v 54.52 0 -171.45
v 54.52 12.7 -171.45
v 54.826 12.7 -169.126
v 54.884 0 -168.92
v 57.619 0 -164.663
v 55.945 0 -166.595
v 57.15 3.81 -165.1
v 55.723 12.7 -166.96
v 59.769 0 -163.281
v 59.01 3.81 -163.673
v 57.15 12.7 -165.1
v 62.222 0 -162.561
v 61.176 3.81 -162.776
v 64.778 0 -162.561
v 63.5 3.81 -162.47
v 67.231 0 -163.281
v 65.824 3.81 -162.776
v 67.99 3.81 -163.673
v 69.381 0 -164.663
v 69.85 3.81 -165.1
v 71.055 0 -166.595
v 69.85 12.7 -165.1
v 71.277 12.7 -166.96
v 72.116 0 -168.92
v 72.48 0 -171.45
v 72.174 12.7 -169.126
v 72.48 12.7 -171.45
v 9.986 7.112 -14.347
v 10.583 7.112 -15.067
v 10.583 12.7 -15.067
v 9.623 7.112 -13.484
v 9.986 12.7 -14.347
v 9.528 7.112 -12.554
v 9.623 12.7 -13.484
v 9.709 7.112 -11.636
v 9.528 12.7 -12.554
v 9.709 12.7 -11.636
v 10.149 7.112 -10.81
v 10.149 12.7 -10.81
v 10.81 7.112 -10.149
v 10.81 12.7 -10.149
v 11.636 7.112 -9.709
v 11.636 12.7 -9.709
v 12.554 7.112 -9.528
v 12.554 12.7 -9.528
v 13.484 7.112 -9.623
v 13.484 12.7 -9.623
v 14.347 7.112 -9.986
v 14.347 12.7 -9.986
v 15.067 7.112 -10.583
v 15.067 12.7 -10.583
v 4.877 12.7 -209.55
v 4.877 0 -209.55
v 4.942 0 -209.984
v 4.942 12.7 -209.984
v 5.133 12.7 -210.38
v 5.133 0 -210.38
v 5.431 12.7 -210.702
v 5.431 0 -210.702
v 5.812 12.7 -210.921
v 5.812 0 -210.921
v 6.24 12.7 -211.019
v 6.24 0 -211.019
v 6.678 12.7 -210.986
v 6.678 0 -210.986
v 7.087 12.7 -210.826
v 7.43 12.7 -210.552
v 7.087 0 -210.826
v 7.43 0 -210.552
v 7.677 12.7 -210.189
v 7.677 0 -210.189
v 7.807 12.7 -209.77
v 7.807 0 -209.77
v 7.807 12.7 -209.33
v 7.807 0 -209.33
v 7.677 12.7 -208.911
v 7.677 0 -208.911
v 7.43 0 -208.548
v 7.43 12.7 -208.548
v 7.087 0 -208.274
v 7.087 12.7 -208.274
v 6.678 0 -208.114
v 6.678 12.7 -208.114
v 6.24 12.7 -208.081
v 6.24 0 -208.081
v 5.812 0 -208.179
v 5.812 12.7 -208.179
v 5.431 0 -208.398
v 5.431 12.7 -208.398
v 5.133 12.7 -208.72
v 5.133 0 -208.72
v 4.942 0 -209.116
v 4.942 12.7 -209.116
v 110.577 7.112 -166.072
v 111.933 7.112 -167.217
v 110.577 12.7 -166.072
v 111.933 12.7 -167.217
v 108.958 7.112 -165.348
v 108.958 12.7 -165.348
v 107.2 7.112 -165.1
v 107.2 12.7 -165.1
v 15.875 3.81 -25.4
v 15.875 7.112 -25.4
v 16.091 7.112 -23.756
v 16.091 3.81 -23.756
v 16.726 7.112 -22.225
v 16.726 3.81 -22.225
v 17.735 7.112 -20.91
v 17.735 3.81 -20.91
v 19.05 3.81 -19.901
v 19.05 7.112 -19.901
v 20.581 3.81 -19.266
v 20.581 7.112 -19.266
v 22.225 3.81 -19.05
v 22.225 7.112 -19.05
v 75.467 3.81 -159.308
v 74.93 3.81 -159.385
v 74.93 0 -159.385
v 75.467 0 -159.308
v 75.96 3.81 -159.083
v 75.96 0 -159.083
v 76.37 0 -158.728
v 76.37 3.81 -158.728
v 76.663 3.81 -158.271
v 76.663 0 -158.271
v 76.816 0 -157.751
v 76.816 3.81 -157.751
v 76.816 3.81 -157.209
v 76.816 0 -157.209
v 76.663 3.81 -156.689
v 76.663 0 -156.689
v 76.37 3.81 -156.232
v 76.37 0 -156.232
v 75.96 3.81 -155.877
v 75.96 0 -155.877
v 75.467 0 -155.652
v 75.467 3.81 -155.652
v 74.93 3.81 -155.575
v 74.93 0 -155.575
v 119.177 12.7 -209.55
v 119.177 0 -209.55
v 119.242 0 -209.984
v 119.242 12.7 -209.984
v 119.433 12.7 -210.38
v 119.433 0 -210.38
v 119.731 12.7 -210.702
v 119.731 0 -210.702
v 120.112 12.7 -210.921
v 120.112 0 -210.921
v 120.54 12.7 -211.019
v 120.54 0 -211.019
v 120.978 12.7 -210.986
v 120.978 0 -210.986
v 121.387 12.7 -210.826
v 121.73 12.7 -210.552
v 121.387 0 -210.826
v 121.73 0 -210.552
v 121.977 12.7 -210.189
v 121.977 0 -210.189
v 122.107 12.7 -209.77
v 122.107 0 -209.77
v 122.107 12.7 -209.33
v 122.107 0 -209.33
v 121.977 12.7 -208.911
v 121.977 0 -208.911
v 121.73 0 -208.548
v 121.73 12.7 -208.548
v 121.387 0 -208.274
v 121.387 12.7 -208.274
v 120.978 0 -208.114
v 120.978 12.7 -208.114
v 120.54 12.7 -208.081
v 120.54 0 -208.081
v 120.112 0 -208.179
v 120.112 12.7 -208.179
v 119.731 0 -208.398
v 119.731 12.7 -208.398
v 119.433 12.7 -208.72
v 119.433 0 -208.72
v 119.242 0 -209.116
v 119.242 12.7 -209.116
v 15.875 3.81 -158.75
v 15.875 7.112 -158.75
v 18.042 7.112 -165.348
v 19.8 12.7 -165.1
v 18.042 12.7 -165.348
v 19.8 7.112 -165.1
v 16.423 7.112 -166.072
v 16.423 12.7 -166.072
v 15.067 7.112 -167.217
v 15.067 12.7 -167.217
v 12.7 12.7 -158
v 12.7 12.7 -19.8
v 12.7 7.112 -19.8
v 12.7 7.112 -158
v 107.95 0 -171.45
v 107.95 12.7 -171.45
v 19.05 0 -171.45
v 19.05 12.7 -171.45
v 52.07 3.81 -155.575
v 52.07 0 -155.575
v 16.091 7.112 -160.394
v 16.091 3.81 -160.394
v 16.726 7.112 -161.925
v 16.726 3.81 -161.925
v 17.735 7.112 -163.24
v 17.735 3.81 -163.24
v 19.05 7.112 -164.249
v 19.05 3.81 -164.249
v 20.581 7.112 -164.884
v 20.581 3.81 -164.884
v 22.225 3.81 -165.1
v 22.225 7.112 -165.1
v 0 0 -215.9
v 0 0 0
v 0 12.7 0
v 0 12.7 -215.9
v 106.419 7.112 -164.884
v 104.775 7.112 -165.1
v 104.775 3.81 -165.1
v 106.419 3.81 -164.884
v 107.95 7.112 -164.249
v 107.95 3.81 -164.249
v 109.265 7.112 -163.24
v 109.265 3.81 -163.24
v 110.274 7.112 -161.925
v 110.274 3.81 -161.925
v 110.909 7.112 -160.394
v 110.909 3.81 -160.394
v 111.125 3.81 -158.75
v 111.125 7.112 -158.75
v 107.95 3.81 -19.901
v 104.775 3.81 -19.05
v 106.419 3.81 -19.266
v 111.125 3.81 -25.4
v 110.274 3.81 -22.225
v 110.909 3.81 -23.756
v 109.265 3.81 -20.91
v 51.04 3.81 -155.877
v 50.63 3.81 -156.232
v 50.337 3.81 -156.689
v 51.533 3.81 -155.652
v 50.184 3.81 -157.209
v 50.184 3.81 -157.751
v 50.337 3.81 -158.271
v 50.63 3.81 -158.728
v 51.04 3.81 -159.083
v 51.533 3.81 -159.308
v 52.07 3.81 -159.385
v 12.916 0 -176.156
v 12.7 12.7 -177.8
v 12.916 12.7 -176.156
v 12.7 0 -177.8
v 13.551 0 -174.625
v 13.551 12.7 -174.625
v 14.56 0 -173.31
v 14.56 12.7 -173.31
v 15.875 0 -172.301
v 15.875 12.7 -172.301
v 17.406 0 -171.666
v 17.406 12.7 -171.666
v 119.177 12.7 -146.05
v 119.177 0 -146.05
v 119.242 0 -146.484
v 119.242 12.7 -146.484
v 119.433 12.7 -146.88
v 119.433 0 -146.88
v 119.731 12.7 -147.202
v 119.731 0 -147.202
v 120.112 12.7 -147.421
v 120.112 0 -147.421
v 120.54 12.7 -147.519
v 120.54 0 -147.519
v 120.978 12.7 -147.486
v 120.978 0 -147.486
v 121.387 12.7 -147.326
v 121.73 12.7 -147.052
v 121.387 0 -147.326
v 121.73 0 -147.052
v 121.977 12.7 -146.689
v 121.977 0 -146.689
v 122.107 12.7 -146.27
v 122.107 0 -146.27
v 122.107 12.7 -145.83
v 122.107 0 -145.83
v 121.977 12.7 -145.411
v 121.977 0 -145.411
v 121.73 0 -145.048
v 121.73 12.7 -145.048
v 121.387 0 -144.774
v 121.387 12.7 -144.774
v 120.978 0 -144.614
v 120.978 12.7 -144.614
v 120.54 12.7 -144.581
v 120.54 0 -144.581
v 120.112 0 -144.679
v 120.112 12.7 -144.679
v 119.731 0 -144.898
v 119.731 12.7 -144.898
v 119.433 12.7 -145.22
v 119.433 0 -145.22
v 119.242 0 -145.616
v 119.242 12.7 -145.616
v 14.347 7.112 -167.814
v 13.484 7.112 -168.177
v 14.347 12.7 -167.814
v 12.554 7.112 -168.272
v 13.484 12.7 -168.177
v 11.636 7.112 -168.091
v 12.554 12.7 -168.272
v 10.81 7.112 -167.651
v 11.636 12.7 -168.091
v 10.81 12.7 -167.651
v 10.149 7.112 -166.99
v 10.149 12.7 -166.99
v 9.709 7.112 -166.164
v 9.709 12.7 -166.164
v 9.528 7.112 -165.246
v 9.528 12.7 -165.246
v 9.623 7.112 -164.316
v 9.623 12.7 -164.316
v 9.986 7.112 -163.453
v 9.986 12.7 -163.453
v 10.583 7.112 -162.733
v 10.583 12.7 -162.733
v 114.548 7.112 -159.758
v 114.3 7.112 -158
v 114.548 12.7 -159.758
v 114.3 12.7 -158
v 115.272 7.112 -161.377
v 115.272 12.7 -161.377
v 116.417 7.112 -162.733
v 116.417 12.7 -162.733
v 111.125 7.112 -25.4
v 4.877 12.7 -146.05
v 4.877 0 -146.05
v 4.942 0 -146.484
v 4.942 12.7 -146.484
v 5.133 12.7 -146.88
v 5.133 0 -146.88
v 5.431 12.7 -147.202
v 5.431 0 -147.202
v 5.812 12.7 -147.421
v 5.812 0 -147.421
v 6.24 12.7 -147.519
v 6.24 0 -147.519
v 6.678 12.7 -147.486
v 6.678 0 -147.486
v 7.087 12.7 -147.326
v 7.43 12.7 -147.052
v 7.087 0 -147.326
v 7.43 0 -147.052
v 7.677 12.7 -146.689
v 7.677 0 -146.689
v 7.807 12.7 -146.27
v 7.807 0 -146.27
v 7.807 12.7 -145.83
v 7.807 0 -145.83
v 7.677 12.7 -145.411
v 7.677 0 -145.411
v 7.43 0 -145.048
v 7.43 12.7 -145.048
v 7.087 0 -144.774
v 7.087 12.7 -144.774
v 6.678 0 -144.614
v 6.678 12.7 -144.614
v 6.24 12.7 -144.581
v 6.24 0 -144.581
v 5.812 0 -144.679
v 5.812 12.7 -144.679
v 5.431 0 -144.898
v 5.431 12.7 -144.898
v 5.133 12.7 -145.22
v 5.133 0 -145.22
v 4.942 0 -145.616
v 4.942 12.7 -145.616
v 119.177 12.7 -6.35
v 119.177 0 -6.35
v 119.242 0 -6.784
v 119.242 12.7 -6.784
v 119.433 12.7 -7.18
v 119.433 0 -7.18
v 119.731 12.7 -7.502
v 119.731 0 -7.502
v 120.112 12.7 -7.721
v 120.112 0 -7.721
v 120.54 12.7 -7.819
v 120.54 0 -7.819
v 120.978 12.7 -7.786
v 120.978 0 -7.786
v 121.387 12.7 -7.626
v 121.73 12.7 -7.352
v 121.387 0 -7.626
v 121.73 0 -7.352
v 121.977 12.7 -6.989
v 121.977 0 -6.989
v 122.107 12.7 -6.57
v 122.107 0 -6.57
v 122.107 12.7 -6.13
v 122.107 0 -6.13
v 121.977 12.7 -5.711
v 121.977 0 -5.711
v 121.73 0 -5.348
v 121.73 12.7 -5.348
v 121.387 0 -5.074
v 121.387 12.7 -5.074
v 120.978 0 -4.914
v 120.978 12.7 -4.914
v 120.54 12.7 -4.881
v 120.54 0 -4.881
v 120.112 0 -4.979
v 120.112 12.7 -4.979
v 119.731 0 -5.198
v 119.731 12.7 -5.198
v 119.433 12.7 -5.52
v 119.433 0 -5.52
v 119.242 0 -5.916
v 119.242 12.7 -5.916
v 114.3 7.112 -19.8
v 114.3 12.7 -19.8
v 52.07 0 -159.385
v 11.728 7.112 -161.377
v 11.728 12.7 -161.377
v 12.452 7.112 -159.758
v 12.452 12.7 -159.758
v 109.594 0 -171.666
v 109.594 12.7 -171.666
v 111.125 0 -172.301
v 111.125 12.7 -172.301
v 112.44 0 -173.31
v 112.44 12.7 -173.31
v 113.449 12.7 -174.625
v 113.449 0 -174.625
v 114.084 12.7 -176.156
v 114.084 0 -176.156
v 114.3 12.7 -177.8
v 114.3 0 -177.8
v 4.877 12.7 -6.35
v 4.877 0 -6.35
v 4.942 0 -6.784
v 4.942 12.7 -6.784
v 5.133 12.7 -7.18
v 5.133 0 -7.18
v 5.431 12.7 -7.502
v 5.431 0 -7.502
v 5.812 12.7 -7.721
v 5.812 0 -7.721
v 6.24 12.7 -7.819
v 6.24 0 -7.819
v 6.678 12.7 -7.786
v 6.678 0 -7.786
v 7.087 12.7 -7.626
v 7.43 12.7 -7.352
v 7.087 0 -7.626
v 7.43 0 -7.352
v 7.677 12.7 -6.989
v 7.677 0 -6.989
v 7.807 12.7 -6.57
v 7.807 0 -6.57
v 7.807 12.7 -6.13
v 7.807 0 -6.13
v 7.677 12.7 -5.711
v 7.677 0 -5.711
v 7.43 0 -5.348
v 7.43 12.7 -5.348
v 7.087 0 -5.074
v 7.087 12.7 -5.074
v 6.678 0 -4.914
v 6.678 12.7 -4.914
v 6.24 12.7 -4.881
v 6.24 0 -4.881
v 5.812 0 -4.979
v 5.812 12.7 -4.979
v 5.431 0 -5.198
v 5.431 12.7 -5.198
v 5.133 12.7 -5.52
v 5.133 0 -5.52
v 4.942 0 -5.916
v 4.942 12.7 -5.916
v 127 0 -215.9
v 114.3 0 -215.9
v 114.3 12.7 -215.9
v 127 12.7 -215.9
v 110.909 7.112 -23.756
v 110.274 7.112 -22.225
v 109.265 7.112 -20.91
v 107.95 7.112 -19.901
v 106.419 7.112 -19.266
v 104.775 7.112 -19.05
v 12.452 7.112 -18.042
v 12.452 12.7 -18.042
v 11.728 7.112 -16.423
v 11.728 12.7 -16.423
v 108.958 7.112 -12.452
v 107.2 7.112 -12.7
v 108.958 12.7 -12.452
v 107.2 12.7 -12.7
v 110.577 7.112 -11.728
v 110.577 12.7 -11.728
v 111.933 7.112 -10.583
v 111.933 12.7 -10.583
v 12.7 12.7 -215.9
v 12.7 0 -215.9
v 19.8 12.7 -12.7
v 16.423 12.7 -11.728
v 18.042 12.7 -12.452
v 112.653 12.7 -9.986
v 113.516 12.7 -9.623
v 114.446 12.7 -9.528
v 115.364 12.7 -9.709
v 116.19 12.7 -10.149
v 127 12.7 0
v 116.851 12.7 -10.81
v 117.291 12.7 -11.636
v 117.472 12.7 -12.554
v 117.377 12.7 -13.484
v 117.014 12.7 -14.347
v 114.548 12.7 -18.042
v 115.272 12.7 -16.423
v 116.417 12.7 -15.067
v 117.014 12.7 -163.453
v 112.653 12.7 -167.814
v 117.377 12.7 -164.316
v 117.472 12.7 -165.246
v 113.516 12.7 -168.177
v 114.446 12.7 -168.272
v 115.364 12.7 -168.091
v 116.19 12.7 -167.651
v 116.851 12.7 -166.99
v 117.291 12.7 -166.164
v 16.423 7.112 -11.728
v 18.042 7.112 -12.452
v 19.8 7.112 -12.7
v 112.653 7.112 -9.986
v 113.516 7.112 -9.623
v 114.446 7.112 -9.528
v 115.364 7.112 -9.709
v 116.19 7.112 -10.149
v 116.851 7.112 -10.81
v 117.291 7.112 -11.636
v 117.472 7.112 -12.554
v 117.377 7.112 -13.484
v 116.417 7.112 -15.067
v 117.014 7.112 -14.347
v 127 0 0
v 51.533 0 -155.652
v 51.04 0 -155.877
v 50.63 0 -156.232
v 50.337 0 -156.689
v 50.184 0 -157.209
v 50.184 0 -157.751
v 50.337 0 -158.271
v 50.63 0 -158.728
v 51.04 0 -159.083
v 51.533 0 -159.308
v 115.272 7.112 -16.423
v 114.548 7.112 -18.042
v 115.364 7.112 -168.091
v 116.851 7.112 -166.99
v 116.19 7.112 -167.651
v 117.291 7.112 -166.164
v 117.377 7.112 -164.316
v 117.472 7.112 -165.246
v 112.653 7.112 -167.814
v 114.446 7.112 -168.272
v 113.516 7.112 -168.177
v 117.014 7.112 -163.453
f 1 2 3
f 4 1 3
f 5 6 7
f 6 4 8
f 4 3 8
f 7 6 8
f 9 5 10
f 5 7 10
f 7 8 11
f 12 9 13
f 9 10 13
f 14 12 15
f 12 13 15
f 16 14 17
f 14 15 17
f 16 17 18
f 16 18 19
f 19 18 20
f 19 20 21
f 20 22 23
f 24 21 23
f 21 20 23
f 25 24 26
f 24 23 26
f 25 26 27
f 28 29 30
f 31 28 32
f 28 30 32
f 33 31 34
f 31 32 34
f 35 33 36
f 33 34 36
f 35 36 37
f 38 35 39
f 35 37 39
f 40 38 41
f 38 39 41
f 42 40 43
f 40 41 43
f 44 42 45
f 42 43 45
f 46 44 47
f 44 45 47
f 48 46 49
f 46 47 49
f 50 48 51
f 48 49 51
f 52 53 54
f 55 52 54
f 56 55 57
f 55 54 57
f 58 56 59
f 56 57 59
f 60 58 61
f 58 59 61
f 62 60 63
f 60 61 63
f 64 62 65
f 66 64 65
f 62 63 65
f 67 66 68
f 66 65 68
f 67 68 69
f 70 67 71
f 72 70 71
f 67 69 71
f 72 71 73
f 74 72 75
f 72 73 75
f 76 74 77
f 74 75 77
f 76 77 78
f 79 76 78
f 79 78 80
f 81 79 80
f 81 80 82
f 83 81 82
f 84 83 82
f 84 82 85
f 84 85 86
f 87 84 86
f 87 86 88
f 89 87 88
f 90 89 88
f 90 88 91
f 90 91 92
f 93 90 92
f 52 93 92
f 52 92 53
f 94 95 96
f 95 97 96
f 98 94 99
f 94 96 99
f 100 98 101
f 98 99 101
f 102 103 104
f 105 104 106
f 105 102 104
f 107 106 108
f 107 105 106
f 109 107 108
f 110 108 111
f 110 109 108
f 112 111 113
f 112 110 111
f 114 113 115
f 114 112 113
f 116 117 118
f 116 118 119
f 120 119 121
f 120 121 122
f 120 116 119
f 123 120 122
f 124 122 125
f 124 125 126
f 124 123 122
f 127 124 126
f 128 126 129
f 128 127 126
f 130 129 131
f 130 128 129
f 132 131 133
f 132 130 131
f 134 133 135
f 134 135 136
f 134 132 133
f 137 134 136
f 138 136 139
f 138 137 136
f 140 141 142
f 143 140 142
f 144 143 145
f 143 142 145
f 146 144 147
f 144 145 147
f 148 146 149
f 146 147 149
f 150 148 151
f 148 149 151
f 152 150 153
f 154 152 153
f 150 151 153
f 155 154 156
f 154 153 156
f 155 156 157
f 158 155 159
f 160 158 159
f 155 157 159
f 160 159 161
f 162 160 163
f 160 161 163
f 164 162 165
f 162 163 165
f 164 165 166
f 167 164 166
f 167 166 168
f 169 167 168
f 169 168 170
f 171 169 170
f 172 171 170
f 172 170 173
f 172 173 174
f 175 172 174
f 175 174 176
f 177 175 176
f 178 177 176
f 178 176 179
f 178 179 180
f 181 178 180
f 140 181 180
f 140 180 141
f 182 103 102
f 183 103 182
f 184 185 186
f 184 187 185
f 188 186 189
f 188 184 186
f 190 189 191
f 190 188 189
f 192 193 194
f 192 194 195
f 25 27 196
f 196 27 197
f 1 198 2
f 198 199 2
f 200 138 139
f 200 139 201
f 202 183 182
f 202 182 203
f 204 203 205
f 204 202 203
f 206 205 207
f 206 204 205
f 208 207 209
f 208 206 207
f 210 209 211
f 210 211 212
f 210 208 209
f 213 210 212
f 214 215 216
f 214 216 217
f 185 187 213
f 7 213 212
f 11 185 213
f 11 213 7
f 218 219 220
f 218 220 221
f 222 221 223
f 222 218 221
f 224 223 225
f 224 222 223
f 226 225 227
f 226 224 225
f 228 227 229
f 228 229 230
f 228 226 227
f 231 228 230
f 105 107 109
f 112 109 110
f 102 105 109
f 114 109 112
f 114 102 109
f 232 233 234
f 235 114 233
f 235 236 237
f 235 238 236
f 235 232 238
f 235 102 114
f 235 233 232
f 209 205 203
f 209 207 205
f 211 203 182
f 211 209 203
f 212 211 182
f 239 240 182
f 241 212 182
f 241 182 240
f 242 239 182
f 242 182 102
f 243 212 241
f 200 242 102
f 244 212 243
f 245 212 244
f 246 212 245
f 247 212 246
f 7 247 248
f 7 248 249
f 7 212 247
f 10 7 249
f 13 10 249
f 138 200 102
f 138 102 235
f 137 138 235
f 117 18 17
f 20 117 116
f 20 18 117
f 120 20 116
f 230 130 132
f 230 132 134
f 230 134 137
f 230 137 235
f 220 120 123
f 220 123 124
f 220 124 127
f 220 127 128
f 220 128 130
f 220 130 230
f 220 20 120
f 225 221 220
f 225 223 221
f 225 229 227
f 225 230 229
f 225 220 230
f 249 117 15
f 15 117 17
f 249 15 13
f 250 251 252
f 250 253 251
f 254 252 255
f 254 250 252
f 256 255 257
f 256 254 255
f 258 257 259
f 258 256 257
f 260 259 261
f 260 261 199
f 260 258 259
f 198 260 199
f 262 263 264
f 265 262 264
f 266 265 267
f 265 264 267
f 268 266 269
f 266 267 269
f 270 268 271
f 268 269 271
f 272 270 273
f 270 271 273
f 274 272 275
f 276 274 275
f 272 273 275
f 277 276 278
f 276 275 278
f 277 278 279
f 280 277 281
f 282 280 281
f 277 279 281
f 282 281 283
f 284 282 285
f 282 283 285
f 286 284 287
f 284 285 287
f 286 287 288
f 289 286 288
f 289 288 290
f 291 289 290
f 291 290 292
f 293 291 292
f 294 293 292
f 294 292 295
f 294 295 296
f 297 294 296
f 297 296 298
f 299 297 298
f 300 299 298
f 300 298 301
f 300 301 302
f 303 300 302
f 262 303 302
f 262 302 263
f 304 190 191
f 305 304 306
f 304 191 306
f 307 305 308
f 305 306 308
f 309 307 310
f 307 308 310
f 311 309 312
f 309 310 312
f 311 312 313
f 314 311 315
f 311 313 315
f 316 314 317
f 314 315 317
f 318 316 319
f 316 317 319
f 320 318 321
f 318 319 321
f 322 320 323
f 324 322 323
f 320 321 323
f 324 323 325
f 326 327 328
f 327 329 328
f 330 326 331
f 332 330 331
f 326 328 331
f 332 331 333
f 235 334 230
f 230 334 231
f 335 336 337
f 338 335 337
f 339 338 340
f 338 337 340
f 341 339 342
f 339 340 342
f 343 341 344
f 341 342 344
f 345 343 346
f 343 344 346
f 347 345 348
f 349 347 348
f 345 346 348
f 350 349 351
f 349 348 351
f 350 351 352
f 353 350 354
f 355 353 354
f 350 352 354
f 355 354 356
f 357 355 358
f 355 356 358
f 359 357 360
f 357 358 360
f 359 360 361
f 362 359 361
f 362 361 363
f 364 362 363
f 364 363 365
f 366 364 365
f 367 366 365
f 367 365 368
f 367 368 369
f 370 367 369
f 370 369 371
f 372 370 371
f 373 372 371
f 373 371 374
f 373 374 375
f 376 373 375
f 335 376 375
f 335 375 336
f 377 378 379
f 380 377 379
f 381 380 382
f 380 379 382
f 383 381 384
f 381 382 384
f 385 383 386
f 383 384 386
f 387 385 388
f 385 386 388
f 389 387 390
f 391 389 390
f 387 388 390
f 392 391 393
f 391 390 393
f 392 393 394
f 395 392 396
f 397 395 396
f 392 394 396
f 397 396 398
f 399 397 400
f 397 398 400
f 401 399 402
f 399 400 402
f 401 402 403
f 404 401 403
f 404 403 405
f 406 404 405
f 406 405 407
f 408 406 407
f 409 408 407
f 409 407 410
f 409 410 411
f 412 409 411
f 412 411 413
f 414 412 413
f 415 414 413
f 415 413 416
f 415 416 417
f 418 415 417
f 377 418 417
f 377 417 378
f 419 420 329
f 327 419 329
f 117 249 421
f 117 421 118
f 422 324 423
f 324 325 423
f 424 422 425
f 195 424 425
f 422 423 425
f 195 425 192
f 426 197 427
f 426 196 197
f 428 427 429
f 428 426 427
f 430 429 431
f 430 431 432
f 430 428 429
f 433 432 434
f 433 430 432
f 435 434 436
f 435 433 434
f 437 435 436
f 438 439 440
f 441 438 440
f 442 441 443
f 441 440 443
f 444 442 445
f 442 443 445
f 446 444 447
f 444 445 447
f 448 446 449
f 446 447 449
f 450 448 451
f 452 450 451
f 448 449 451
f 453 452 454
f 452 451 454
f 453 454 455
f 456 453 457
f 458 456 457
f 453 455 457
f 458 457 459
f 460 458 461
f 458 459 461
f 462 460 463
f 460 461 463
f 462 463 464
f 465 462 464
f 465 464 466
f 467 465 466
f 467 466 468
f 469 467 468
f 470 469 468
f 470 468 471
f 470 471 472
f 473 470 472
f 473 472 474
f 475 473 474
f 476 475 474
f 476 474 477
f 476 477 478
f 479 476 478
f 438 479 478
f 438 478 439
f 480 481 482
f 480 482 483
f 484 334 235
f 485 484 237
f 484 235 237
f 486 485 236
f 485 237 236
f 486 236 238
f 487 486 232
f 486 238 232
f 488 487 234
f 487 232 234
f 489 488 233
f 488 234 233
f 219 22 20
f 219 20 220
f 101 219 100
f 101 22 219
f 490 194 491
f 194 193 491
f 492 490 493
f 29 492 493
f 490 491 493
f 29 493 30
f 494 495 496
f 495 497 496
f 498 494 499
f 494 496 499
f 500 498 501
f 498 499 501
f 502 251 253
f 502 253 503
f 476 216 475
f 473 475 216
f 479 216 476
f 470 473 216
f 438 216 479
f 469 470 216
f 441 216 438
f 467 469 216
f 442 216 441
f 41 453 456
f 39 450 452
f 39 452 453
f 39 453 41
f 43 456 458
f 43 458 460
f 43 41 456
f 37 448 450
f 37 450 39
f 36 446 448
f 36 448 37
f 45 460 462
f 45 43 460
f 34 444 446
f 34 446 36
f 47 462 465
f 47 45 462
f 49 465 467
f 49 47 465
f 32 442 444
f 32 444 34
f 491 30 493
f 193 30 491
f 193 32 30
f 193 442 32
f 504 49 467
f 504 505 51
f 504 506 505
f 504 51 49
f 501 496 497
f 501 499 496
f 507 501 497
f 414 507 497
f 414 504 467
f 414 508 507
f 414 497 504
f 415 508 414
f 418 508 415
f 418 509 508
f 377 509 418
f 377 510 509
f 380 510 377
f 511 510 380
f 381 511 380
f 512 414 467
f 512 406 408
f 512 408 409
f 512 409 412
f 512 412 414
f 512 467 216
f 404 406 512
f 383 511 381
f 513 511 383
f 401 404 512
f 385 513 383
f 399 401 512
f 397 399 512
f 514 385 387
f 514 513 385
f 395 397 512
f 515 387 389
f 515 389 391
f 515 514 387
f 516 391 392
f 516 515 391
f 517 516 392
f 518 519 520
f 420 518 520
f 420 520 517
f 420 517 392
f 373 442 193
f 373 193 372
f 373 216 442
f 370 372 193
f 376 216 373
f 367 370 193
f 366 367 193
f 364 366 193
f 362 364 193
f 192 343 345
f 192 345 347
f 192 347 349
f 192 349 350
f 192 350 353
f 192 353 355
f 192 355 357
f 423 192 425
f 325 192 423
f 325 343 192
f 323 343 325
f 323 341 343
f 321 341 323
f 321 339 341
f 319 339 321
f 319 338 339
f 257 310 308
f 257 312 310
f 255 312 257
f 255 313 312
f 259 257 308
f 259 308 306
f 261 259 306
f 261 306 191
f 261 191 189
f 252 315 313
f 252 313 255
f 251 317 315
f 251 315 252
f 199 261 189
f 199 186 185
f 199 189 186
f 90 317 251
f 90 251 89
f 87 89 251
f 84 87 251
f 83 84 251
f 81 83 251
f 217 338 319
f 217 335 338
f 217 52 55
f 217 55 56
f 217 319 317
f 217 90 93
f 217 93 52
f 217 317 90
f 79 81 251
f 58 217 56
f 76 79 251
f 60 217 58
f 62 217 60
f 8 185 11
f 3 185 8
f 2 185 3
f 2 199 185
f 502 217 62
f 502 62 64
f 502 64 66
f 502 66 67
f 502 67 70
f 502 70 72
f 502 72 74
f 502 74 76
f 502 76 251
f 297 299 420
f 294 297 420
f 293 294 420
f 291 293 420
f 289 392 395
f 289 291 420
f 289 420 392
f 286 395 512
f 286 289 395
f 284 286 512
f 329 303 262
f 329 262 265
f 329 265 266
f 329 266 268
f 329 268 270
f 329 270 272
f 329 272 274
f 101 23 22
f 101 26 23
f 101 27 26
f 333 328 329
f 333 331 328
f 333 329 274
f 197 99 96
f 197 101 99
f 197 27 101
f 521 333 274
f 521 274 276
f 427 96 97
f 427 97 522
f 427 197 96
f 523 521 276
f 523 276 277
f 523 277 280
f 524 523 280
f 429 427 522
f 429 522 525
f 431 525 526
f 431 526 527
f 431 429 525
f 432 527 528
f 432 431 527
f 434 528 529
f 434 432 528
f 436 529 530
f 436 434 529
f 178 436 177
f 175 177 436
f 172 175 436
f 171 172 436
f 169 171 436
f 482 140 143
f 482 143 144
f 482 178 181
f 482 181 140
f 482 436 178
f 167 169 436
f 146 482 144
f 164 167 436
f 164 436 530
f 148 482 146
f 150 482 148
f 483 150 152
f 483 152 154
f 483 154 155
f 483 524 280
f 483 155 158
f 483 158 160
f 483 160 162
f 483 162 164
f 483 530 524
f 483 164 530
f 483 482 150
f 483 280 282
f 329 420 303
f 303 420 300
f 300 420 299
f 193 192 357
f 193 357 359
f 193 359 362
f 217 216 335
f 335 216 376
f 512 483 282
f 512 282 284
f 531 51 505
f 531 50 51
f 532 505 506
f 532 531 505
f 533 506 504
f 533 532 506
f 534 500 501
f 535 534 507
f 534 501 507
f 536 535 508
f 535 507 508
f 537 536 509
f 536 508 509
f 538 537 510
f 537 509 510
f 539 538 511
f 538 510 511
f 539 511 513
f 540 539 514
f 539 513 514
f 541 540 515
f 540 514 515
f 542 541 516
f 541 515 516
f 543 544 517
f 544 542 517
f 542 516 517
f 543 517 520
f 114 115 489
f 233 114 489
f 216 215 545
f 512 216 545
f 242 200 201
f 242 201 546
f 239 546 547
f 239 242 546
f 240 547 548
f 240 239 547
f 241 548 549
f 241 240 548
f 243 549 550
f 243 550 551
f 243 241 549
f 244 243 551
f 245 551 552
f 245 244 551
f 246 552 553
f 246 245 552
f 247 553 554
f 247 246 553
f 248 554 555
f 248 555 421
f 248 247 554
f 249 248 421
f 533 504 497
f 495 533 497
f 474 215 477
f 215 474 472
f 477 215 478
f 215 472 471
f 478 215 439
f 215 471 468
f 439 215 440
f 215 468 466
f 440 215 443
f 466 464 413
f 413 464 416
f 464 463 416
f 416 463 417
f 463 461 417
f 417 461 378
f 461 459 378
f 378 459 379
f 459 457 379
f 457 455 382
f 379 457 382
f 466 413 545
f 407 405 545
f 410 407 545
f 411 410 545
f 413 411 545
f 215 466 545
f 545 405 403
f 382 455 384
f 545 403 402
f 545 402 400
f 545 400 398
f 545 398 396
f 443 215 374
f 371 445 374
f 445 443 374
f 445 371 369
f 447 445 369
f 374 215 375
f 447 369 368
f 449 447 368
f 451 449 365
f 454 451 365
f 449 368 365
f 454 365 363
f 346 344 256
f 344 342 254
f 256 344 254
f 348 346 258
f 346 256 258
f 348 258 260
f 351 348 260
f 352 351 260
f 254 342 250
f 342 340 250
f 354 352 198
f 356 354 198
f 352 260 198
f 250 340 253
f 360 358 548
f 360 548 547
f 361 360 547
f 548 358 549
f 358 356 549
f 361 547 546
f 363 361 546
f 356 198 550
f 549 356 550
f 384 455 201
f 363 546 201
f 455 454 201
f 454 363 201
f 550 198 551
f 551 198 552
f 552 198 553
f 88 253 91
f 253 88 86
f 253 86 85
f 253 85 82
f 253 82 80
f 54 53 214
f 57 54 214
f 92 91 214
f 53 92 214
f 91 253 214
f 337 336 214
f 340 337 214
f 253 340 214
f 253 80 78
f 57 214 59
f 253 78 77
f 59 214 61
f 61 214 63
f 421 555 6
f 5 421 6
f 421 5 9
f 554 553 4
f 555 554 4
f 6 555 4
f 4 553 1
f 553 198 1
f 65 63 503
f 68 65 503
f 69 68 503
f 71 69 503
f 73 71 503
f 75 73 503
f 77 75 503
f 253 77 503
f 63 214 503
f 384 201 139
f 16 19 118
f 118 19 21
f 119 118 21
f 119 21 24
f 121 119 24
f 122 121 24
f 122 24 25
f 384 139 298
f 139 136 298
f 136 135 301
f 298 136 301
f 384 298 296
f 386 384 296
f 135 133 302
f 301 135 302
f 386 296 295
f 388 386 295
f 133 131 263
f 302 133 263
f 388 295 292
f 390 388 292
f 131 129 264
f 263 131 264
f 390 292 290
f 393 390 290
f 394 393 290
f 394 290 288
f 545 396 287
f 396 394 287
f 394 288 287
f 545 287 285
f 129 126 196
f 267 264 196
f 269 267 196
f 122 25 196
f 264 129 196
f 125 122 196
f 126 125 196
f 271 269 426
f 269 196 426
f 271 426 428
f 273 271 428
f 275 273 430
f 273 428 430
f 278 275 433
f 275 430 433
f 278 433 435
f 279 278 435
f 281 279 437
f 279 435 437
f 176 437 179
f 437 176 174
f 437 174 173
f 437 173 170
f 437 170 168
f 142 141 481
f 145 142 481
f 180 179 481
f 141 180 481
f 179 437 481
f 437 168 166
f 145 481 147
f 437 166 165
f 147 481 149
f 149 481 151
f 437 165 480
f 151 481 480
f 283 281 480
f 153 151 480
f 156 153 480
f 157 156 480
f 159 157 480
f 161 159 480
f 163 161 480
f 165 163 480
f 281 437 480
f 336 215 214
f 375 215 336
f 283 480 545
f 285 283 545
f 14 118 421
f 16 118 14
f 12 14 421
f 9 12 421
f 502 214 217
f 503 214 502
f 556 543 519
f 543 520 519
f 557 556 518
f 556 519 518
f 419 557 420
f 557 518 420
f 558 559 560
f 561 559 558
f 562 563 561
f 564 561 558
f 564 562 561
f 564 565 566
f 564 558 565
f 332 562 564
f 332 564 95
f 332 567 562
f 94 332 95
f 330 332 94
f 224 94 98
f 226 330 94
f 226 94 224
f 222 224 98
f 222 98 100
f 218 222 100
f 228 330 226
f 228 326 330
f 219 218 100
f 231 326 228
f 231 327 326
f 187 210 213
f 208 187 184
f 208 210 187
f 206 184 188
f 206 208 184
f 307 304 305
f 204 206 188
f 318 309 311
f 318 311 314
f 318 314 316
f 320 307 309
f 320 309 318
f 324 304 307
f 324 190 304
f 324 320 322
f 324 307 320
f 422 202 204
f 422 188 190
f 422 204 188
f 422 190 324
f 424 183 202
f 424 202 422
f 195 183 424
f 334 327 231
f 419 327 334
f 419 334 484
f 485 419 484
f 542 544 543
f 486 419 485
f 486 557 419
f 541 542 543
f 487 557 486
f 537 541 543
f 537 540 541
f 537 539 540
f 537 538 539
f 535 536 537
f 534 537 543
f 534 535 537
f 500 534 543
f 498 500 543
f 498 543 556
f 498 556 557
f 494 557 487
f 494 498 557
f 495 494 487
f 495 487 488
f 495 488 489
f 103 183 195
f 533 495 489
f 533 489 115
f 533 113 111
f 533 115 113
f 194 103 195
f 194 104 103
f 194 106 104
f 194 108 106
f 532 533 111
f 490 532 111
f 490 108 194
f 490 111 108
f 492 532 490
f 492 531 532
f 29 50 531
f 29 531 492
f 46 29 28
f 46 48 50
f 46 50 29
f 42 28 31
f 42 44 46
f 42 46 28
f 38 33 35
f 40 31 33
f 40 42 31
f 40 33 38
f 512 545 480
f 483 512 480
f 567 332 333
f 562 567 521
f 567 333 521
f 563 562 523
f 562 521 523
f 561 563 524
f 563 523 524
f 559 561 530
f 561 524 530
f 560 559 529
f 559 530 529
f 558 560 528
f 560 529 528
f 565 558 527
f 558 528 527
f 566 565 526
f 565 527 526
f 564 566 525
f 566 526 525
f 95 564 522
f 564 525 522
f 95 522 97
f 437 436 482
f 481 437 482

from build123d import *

# Parameters (mm, degrees)
SKETCH2_W                   = 127
SKETCH2_H                   = 215.9
BOSS_EXTRUDE1_DEPTH         = 12.7
SKETCH5_W                   = 101.6
SKETCH5_H                   = 152.4
CUT_EXTRUDE3_DEPTH          = 5.588
SKETCH6_W                   = 101.6
SKETCH6_H                   = 44.45
CUT_EXTRUDE4_DEPTH          = 251.804904258
SKETCH8_R                   = 8.980256121
CUT_EXTRUDE6_DEPTH          = 251.804904258
SKETCH9_W                   = 95.25
SKETCH9_H                   = 146.05
CUT_EXTRUDE7_DEPTH          = 3.302
CUT_EXTRUDE8_DEPTH          = 3.81
F_32_0_116_DIAMETER_HOLE1_D = 2.9464
SKETCH18_R                  = 3.175
CUT_EXTRUDE9_DEPTH          = 5.588
FILLET5_R                   = 6.35
FILLET7_R                   = 6.35
FILLET8_R                   = 6.35
FILLET10_R                  = 6.35
FILLET11_R                  = 6.35


with BuildPart() as part:
    # Sketch2 → Boss-Extrude1 (new body)
    with BuildSketch(Plane(origin=(0, 0, 0), x_dir=(1, 0, 0), z_dir=(0, 1, 0))):
        with Locations((63.5, 107.95)):
            Rectangle(SKETCH2_W, SKETCH2_H)
    extrude(amount=BOSS_EXTRUDE1_DEPTH)

    # Sketch5 → Cut-Extrude3 (cut)
    with BuildSketch(Plane(origin=(0, 12.7, 0), x_dir=(1, 0, 0), z_dir=(0, 1, 0))):
        with Locations((63.5, 88.9)):
            Rectangle(SKETCH5_W, SKETCH5_H)
    extrude(amount=-CUT_EXTRUDE3_DEPTH, mode=Mode.SUBTRACT)

    # Sketch6 → Cut-Extrude4 (cut, through all)
    with BuildSketch(Plane(origin=(0, 12.7, 0), x_dir=(1, 0, 0), z_dir=(0, 1, 0))):
        with Locations((63.5, 193.675)):
            Rectangle(SKETCH6_W, SKETCH6_H)
    extrude(amount=-CUT_EXTRUDE4_DEPTH, mode=Mode.SUBTRACT)

    # Sketch8 → Cut-Extrude6 (cut, through all)
    with BuildSketch(Plane(origin=(0, 12.7, 0), x_dir=(1, 0, 0), z_dir=(0, 1, 0))):
        with Locations((63.5, 171.45)):
            Circle(SKETCH8_R)
    extrude(amount=-CUT_EXTRUDE6_DEPTH, mode=Mode.SUBTRACT)

    # Sketch9 → Cut-Extrude7 (cut)
    with BuildSketch(Plane(origin=(0, 7.112, 0), x_dir=(1, 0, 0), z_dir=(0, 1, 0))):
        with Locations((63.5, 92.075)):
            Rectangle(SKETCH9_W, SKETCH9_H)
    extrude(amount=-CUT_EXTRUDE7_DEPTH, mode=Mode.SUBTRACT)

    # Sketch11 → Cut-Extrude8 (cut)
    with BuildSketch(Plane(origin=(0, 3.81, 0), x_dir=(1, 0, 0), z_dir=(0, 1, 0))):
        with BuildLine():
            Line((74.93, 155.575), (52.07, 155.575))
            ThreePointArc((52.07, 155.575), (50.165, 157.48), (52.07, 159.385))
            Line((52.07, 159.385), (74.93, 159.385))
            ThreePointArc((74.93, 159.385), (76.835, 157.48), (74.93, 155.575))
        make_face()
    extrude(amount=-CUT_EXTRUDE8_DEPTH, mode=Mode.SUBTRACT)

    # #32 (0.116) Diameter Hole1 (through all)
    with Locations(Plane(origin=(0, 12.7, 0), x_dir=(1, 0, 0), z_dir=(0, 1, 0))):
        with Locations((6.35, 209.55), (120.65, 209.55), (120.65, 6.35), (6.35, 6.35), (6.35, 146.05), (120.65, 146.05)):
            Hole(F_32_0_116_DIAMETER_HOLE1_D / 2)

    # Sketch18 → Cut-Extrude9 (cut)
    with BuildSketch(Plane(origin=(0, 12.7, 0), x_dir=(1, 0, 0), z_dir=(0, 1, 0))):
        with Locations((12.7, 165.1)):
            Circle(SKETCH18_R)
        with Locations((114.3, 165.1)):
            Circle(SKETCH18_R)
        with Locations((114.3, 12.7)):
            Circle(SKETCH18_R)
        with Locations((12.7, 12.7)):
            Circle(SKETCH18_R)
    extrude(amount=-CUT_EXTRUDE9_DEPTH, mode=Mode.SUBTRACT)

    # Fillet5
    fillet5_edges = [part.edges().sort_by_distance(p)[0] for p in [
        (12.7, 9.906, -15.875),
        (15.875, 9.906, -12.7),
        (114.3, 9.906, -15.875),
        (111.125, 9.906, -12.7),
        (111.125, 9.906, -165.1),
        (114.3, 9.906, -161.925),
        (15.875, 9.906, -165.1),
        (12.7, 9.906, -161.925),
    ]]
    fillet(fillet5_edges, radius=FILLET5_R)

    # Fillet7
    fillet7_edges = [part.edges().sort_by_distance(p)[0] for p in [
        (12.7, 6.35, -171.45),
        (114.3, 6.35, -171.45),
    ]]
    fillet(fillet7_edges, radius=FILLET7_R)

    # Fillet8
    fillet8_edges = [part.edges().sort_by_distance(p)[0] for p in [
        (15.875, 5.461, -19.05),
        (111.125, 5.461, -19.05),
    ]]
    fillet(fillet8_edges, radius=FILLET8_R)

    # Fillet10
    # the kernel refuses this fillet: 6.35 mm, written as the material it adds along each edge
    with BuildSketch(Plane(origin=(111.125, 7.112, -165.1), x_dir=(-1, 0, 0), z_dir=(0, -1, 0))) as fillet10_piece_1:
        with BuildLine():
            CenterArc((FILLET10_R, -FILLET10_R), FILLET10_R, 90, 90)
            Line((0, -FILLET10_R), (0, 0))
            Line((0, 0), (FILLET10_R, 0))
        make_face()
    extrude(amount=3.302)

    # Fillet11
    # the kernel refuses this fillet: 6.35 mm, written as the material it adds along each edge
    with BuildSketch(Plane(origin=(15.875, 7.112, -165.1), x_dir=(1, 0, 0), z_dir=(0, -1, 0))) as fillet11_piece_1:
        with BuildLine():
            CenterArc((FILLET11_R, FILLET11_R), FILLET11_R, 180, 90)
            Line((0, FILLET11_R), (0, 0))
            Line((0, 0), (FILLET11_R, 0))
        make_face()
    extrude(amount=3.302)


solid = part.part
